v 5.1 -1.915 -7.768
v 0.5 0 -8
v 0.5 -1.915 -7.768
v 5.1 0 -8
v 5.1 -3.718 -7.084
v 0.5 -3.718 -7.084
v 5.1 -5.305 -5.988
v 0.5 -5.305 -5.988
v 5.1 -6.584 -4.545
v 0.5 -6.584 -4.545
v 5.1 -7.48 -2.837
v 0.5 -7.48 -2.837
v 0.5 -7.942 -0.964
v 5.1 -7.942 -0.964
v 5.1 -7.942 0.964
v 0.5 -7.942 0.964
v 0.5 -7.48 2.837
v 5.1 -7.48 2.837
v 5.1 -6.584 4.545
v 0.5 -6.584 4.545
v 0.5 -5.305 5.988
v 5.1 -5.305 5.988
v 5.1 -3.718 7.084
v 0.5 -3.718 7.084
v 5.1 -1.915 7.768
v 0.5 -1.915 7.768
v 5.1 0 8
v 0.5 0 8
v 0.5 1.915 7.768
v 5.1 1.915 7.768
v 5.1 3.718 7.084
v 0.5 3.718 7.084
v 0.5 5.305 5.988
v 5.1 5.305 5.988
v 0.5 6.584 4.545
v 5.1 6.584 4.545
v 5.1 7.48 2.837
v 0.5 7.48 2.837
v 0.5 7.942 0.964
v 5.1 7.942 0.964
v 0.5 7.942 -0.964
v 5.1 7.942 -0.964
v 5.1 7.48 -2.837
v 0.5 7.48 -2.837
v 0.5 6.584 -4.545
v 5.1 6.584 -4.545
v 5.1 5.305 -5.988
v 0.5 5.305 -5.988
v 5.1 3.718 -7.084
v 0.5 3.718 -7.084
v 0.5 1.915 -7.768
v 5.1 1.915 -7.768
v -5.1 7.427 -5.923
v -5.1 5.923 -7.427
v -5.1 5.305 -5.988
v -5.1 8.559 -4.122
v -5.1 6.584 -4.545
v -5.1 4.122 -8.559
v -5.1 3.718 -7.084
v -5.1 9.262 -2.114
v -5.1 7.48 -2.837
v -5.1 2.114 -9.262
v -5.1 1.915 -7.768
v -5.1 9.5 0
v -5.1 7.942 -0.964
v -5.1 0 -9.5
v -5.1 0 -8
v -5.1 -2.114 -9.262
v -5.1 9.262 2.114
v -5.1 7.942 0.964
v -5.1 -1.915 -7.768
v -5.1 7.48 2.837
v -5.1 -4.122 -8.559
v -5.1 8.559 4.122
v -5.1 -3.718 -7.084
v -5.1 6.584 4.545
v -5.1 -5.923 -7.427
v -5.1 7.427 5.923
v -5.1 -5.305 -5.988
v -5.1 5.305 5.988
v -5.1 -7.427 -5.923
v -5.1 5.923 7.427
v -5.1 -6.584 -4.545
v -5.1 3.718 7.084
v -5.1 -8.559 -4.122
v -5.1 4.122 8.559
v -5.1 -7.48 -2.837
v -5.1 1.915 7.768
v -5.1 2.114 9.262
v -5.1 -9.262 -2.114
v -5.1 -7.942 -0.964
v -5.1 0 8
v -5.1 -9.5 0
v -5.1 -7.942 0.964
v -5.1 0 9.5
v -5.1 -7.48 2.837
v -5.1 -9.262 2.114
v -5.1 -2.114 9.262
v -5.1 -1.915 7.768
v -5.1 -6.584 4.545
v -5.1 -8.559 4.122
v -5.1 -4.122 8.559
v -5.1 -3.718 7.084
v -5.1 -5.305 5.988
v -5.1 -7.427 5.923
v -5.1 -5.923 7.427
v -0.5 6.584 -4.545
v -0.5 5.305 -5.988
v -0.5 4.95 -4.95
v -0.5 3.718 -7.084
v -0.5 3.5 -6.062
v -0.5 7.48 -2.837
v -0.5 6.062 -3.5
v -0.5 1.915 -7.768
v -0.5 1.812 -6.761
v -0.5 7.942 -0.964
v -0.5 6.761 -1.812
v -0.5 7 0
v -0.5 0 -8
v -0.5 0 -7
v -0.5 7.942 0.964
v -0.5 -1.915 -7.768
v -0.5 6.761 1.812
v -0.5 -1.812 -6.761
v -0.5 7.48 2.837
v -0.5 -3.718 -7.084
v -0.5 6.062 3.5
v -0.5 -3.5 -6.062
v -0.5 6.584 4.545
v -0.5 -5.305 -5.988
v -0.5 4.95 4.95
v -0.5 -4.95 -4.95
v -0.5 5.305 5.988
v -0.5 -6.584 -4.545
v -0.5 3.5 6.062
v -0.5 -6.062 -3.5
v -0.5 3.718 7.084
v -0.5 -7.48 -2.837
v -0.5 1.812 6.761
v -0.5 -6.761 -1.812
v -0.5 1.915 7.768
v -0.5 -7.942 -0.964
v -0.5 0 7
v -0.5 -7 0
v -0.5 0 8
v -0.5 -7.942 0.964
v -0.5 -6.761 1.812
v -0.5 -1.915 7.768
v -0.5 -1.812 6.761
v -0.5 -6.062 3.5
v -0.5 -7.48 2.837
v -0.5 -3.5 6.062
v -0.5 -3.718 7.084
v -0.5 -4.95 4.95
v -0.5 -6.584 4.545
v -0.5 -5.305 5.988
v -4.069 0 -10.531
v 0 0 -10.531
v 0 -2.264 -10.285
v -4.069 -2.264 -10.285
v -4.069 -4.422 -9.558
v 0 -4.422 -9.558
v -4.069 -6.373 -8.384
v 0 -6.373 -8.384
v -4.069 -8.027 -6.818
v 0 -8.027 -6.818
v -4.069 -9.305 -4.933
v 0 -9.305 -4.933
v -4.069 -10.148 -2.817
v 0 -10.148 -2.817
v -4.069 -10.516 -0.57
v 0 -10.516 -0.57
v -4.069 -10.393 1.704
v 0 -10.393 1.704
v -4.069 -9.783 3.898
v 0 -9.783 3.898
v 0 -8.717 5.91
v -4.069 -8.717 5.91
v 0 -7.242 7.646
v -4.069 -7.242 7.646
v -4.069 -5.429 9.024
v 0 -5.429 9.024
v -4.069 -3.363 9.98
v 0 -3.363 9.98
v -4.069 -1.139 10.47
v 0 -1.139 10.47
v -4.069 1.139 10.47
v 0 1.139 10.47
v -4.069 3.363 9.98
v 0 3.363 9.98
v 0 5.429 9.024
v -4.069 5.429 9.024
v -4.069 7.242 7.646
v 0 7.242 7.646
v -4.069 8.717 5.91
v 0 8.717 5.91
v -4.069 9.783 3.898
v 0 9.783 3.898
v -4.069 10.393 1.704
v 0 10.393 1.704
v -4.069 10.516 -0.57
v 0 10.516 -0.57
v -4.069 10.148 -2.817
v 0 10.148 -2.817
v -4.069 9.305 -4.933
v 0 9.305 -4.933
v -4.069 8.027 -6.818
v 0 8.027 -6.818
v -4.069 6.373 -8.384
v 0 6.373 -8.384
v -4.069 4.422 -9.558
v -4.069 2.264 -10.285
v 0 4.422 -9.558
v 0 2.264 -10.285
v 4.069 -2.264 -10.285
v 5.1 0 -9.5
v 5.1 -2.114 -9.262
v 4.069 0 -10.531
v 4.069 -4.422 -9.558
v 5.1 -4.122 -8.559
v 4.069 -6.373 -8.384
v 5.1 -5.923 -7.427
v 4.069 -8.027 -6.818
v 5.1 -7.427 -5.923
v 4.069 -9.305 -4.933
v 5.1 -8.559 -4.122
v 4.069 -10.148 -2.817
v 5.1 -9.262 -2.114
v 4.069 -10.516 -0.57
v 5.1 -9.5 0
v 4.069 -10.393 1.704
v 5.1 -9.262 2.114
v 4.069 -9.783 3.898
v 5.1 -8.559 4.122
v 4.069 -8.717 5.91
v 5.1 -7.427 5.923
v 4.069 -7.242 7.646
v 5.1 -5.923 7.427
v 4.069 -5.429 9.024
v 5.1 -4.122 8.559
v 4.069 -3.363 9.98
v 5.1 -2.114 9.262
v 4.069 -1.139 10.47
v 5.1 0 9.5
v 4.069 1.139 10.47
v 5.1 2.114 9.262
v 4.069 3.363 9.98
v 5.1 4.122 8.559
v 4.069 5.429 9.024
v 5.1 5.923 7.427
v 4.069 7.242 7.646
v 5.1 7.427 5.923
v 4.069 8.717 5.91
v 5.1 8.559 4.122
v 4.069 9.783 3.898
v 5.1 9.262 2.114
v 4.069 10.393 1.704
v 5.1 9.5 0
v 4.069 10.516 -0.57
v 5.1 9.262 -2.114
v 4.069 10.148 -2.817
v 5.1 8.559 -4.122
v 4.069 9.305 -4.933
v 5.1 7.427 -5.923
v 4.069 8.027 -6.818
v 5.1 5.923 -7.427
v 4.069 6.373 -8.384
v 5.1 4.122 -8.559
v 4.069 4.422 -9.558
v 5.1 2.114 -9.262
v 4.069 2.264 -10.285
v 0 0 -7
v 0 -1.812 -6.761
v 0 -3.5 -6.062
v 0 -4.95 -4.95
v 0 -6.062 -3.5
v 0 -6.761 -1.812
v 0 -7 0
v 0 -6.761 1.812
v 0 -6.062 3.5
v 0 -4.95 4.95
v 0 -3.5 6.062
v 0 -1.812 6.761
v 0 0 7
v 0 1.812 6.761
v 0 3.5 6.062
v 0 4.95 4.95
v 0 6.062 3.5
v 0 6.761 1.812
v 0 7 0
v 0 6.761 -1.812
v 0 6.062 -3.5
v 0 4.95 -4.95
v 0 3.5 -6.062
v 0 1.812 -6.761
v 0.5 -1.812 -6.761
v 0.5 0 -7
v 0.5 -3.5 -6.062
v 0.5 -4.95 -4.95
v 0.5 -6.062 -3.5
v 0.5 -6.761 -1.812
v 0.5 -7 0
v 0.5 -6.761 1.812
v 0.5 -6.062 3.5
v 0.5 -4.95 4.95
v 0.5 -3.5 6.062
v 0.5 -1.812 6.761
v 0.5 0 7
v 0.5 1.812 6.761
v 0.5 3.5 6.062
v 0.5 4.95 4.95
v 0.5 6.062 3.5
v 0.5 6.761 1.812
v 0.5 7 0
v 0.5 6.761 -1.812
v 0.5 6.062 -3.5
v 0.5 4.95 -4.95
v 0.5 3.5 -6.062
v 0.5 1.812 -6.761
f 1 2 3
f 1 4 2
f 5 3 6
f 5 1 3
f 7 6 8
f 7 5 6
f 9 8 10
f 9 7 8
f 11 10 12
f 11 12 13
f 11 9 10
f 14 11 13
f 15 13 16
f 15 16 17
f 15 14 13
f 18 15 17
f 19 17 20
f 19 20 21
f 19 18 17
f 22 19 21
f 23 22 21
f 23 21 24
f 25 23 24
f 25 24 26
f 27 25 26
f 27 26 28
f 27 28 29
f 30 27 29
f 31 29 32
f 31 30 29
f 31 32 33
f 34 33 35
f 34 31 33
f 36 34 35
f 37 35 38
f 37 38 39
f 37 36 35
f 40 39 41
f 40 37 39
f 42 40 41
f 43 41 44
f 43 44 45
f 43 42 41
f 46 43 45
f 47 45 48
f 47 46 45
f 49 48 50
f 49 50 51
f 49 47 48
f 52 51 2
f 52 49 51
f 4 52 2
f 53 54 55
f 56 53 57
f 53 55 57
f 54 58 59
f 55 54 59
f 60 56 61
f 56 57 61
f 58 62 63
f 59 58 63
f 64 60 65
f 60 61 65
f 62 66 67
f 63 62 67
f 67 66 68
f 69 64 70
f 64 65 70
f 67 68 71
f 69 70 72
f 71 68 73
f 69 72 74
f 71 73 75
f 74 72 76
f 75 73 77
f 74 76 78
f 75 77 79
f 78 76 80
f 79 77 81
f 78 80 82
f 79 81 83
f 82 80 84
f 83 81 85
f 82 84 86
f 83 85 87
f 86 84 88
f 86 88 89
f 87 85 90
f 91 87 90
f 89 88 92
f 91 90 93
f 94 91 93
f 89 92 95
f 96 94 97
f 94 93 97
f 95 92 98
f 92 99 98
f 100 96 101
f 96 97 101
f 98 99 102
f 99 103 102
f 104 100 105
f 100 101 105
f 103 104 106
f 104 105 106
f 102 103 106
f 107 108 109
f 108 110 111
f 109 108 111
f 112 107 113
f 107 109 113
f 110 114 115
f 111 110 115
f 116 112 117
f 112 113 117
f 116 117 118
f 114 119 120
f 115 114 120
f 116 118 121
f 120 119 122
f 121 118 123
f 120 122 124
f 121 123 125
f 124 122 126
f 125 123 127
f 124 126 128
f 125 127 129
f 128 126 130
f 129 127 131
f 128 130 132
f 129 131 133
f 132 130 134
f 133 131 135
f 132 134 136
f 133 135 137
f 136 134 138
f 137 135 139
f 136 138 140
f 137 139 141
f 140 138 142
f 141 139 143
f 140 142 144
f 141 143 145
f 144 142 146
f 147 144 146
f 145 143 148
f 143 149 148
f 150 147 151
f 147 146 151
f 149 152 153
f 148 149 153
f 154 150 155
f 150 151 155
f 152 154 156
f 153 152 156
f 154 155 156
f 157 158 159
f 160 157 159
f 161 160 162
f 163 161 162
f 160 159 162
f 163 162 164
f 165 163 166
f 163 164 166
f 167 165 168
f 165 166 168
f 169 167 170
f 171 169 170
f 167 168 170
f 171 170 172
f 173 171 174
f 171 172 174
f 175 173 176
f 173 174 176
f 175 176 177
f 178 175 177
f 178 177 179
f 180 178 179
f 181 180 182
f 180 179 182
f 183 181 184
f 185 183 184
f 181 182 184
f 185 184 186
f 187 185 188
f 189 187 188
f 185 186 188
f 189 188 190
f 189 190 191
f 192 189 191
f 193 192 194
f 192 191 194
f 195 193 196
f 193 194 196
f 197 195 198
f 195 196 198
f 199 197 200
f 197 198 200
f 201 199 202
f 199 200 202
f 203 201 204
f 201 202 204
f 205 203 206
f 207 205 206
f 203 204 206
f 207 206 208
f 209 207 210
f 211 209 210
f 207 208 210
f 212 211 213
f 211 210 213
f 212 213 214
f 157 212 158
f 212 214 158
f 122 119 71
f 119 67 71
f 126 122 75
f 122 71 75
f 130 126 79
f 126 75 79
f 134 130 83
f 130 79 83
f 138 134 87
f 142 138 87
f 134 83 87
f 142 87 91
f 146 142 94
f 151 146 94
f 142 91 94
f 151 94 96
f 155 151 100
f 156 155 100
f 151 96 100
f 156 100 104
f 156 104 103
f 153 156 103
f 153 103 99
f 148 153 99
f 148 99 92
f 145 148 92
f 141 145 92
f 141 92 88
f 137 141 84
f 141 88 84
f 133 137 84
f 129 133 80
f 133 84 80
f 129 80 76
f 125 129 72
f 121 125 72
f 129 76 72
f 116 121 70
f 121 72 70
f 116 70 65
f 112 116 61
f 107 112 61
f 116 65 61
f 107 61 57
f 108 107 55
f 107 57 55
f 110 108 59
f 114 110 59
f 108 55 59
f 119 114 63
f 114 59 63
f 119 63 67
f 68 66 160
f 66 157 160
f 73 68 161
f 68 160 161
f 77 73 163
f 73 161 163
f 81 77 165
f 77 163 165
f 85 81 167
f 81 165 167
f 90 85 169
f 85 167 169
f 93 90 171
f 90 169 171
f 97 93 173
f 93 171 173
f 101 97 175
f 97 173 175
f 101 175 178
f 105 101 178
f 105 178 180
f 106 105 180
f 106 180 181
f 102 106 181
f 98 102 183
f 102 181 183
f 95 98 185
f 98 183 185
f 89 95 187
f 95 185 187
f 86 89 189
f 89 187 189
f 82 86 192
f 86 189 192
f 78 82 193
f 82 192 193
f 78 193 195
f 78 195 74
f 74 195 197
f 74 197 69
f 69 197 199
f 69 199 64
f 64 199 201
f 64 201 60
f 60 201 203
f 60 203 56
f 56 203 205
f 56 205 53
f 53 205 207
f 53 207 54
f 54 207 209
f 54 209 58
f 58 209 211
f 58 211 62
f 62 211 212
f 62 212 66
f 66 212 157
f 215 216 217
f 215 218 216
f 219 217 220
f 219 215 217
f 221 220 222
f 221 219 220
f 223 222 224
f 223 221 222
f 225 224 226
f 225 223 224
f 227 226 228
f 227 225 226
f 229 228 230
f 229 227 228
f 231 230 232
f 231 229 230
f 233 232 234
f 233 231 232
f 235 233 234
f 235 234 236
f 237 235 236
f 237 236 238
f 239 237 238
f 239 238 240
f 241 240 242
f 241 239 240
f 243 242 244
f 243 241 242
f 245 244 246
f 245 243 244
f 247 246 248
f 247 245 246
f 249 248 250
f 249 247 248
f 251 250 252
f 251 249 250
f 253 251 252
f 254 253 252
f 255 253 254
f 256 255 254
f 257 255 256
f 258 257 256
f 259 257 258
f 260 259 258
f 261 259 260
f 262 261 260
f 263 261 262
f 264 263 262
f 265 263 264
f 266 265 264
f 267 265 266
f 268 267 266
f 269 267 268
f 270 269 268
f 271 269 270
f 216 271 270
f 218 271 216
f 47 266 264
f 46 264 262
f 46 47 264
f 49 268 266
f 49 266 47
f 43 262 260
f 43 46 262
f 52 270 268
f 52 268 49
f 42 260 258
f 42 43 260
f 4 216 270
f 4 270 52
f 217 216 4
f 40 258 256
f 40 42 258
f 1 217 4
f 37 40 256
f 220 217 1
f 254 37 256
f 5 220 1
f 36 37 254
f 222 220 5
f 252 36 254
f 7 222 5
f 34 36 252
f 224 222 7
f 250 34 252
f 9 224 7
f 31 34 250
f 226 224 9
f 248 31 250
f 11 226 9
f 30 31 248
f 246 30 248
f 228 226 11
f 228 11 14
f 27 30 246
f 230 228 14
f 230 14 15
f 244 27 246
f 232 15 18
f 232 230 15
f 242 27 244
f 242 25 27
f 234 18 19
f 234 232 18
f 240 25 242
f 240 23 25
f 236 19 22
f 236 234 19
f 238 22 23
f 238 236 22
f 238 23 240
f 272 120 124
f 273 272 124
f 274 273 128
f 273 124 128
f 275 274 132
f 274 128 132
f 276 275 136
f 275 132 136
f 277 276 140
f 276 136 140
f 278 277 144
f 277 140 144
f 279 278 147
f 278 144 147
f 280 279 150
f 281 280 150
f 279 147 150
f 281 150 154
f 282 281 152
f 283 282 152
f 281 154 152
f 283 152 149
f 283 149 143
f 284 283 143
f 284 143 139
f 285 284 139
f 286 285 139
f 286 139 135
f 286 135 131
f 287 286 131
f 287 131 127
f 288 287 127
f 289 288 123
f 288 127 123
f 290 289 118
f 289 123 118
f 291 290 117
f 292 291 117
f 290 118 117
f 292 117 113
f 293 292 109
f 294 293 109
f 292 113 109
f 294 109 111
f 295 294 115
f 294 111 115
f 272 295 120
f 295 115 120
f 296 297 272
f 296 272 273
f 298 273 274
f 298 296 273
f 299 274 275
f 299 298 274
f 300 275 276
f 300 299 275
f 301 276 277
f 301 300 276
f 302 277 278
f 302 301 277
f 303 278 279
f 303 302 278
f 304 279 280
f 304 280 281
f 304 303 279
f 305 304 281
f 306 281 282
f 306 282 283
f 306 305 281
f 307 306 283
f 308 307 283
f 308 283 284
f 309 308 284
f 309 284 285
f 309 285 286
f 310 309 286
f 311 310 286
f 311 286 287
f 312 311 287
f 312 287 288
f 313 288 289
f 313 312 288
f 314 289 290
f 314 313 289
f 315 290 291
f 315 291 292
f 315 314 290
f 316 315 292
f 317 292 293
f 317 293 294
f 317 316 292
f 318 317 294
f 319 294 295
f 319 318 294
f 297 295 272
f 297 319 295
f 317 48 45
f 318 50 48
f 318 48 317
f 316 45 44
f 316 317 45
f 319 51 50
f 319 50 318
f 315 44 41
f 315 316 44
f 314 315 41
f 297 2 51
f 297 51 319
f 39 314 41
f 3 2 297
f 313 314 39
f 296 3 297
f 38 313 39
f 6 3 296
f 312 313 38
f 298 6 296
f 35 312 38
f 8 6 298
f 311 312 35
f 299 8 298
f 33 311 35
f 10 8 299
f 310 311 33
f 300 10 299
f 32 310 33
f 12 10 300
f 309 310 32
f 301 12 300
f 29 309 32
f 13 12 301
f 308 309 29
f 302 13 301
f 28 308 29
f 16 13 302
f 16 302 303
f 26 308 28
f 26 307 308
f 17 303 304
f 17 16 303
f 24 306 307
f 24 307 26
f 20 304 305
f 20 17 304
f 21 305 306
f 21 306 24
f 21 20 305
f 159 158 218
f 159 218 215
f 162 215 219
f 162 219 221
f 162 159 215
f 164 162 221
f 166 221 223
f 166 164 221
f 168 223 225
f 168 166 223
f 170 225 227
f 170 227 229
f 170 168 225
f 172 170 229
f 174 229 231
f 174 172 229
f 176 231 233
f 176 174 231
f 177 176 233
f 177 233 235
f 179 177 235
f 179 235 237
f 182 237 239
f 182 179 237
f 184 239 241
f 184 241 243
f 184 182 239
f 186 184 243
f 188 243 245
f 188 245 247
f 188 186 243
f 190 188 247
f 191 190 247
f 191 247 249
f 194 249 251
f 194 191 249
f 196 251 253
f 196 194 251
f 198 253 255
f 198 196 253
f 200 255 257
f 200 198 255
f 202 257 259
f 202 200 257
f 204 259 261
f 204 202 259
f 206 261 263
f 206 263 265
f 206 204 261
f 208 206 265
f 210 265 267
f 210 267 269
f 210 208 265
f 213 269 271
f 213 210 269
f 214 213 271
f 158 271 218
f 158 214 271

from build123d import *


with BuildPart() as part:
    # Sketch1 → Revolve1 (revolve)
    with BuildSketch(Plane.XY, mode=Mode.PRIVATE) as revolve1_sk:
        Polygon((0, 7), (-0.5, 7), (-0.5, 8), (-5.1, 8), (-5.1, 9.5), (-4.068629558, 10.531370442), (0, 10.531370442), align=None)
    revolve1 = revolve(revolve1_sk.sketch.rotate(Axis((0, 0, 0), (-1, 0, 0)), 90), axis=Axis((0, 0, 0), (-1, 0, 0)))

    # Mirror1: Revolve1 across plane
    add(revolve1.mirror(Plane(origin=(0, 10.531370442, 0), x_dir=(0, 0, 1), z_dir=(1, 0, 0))))


solid = part.part
